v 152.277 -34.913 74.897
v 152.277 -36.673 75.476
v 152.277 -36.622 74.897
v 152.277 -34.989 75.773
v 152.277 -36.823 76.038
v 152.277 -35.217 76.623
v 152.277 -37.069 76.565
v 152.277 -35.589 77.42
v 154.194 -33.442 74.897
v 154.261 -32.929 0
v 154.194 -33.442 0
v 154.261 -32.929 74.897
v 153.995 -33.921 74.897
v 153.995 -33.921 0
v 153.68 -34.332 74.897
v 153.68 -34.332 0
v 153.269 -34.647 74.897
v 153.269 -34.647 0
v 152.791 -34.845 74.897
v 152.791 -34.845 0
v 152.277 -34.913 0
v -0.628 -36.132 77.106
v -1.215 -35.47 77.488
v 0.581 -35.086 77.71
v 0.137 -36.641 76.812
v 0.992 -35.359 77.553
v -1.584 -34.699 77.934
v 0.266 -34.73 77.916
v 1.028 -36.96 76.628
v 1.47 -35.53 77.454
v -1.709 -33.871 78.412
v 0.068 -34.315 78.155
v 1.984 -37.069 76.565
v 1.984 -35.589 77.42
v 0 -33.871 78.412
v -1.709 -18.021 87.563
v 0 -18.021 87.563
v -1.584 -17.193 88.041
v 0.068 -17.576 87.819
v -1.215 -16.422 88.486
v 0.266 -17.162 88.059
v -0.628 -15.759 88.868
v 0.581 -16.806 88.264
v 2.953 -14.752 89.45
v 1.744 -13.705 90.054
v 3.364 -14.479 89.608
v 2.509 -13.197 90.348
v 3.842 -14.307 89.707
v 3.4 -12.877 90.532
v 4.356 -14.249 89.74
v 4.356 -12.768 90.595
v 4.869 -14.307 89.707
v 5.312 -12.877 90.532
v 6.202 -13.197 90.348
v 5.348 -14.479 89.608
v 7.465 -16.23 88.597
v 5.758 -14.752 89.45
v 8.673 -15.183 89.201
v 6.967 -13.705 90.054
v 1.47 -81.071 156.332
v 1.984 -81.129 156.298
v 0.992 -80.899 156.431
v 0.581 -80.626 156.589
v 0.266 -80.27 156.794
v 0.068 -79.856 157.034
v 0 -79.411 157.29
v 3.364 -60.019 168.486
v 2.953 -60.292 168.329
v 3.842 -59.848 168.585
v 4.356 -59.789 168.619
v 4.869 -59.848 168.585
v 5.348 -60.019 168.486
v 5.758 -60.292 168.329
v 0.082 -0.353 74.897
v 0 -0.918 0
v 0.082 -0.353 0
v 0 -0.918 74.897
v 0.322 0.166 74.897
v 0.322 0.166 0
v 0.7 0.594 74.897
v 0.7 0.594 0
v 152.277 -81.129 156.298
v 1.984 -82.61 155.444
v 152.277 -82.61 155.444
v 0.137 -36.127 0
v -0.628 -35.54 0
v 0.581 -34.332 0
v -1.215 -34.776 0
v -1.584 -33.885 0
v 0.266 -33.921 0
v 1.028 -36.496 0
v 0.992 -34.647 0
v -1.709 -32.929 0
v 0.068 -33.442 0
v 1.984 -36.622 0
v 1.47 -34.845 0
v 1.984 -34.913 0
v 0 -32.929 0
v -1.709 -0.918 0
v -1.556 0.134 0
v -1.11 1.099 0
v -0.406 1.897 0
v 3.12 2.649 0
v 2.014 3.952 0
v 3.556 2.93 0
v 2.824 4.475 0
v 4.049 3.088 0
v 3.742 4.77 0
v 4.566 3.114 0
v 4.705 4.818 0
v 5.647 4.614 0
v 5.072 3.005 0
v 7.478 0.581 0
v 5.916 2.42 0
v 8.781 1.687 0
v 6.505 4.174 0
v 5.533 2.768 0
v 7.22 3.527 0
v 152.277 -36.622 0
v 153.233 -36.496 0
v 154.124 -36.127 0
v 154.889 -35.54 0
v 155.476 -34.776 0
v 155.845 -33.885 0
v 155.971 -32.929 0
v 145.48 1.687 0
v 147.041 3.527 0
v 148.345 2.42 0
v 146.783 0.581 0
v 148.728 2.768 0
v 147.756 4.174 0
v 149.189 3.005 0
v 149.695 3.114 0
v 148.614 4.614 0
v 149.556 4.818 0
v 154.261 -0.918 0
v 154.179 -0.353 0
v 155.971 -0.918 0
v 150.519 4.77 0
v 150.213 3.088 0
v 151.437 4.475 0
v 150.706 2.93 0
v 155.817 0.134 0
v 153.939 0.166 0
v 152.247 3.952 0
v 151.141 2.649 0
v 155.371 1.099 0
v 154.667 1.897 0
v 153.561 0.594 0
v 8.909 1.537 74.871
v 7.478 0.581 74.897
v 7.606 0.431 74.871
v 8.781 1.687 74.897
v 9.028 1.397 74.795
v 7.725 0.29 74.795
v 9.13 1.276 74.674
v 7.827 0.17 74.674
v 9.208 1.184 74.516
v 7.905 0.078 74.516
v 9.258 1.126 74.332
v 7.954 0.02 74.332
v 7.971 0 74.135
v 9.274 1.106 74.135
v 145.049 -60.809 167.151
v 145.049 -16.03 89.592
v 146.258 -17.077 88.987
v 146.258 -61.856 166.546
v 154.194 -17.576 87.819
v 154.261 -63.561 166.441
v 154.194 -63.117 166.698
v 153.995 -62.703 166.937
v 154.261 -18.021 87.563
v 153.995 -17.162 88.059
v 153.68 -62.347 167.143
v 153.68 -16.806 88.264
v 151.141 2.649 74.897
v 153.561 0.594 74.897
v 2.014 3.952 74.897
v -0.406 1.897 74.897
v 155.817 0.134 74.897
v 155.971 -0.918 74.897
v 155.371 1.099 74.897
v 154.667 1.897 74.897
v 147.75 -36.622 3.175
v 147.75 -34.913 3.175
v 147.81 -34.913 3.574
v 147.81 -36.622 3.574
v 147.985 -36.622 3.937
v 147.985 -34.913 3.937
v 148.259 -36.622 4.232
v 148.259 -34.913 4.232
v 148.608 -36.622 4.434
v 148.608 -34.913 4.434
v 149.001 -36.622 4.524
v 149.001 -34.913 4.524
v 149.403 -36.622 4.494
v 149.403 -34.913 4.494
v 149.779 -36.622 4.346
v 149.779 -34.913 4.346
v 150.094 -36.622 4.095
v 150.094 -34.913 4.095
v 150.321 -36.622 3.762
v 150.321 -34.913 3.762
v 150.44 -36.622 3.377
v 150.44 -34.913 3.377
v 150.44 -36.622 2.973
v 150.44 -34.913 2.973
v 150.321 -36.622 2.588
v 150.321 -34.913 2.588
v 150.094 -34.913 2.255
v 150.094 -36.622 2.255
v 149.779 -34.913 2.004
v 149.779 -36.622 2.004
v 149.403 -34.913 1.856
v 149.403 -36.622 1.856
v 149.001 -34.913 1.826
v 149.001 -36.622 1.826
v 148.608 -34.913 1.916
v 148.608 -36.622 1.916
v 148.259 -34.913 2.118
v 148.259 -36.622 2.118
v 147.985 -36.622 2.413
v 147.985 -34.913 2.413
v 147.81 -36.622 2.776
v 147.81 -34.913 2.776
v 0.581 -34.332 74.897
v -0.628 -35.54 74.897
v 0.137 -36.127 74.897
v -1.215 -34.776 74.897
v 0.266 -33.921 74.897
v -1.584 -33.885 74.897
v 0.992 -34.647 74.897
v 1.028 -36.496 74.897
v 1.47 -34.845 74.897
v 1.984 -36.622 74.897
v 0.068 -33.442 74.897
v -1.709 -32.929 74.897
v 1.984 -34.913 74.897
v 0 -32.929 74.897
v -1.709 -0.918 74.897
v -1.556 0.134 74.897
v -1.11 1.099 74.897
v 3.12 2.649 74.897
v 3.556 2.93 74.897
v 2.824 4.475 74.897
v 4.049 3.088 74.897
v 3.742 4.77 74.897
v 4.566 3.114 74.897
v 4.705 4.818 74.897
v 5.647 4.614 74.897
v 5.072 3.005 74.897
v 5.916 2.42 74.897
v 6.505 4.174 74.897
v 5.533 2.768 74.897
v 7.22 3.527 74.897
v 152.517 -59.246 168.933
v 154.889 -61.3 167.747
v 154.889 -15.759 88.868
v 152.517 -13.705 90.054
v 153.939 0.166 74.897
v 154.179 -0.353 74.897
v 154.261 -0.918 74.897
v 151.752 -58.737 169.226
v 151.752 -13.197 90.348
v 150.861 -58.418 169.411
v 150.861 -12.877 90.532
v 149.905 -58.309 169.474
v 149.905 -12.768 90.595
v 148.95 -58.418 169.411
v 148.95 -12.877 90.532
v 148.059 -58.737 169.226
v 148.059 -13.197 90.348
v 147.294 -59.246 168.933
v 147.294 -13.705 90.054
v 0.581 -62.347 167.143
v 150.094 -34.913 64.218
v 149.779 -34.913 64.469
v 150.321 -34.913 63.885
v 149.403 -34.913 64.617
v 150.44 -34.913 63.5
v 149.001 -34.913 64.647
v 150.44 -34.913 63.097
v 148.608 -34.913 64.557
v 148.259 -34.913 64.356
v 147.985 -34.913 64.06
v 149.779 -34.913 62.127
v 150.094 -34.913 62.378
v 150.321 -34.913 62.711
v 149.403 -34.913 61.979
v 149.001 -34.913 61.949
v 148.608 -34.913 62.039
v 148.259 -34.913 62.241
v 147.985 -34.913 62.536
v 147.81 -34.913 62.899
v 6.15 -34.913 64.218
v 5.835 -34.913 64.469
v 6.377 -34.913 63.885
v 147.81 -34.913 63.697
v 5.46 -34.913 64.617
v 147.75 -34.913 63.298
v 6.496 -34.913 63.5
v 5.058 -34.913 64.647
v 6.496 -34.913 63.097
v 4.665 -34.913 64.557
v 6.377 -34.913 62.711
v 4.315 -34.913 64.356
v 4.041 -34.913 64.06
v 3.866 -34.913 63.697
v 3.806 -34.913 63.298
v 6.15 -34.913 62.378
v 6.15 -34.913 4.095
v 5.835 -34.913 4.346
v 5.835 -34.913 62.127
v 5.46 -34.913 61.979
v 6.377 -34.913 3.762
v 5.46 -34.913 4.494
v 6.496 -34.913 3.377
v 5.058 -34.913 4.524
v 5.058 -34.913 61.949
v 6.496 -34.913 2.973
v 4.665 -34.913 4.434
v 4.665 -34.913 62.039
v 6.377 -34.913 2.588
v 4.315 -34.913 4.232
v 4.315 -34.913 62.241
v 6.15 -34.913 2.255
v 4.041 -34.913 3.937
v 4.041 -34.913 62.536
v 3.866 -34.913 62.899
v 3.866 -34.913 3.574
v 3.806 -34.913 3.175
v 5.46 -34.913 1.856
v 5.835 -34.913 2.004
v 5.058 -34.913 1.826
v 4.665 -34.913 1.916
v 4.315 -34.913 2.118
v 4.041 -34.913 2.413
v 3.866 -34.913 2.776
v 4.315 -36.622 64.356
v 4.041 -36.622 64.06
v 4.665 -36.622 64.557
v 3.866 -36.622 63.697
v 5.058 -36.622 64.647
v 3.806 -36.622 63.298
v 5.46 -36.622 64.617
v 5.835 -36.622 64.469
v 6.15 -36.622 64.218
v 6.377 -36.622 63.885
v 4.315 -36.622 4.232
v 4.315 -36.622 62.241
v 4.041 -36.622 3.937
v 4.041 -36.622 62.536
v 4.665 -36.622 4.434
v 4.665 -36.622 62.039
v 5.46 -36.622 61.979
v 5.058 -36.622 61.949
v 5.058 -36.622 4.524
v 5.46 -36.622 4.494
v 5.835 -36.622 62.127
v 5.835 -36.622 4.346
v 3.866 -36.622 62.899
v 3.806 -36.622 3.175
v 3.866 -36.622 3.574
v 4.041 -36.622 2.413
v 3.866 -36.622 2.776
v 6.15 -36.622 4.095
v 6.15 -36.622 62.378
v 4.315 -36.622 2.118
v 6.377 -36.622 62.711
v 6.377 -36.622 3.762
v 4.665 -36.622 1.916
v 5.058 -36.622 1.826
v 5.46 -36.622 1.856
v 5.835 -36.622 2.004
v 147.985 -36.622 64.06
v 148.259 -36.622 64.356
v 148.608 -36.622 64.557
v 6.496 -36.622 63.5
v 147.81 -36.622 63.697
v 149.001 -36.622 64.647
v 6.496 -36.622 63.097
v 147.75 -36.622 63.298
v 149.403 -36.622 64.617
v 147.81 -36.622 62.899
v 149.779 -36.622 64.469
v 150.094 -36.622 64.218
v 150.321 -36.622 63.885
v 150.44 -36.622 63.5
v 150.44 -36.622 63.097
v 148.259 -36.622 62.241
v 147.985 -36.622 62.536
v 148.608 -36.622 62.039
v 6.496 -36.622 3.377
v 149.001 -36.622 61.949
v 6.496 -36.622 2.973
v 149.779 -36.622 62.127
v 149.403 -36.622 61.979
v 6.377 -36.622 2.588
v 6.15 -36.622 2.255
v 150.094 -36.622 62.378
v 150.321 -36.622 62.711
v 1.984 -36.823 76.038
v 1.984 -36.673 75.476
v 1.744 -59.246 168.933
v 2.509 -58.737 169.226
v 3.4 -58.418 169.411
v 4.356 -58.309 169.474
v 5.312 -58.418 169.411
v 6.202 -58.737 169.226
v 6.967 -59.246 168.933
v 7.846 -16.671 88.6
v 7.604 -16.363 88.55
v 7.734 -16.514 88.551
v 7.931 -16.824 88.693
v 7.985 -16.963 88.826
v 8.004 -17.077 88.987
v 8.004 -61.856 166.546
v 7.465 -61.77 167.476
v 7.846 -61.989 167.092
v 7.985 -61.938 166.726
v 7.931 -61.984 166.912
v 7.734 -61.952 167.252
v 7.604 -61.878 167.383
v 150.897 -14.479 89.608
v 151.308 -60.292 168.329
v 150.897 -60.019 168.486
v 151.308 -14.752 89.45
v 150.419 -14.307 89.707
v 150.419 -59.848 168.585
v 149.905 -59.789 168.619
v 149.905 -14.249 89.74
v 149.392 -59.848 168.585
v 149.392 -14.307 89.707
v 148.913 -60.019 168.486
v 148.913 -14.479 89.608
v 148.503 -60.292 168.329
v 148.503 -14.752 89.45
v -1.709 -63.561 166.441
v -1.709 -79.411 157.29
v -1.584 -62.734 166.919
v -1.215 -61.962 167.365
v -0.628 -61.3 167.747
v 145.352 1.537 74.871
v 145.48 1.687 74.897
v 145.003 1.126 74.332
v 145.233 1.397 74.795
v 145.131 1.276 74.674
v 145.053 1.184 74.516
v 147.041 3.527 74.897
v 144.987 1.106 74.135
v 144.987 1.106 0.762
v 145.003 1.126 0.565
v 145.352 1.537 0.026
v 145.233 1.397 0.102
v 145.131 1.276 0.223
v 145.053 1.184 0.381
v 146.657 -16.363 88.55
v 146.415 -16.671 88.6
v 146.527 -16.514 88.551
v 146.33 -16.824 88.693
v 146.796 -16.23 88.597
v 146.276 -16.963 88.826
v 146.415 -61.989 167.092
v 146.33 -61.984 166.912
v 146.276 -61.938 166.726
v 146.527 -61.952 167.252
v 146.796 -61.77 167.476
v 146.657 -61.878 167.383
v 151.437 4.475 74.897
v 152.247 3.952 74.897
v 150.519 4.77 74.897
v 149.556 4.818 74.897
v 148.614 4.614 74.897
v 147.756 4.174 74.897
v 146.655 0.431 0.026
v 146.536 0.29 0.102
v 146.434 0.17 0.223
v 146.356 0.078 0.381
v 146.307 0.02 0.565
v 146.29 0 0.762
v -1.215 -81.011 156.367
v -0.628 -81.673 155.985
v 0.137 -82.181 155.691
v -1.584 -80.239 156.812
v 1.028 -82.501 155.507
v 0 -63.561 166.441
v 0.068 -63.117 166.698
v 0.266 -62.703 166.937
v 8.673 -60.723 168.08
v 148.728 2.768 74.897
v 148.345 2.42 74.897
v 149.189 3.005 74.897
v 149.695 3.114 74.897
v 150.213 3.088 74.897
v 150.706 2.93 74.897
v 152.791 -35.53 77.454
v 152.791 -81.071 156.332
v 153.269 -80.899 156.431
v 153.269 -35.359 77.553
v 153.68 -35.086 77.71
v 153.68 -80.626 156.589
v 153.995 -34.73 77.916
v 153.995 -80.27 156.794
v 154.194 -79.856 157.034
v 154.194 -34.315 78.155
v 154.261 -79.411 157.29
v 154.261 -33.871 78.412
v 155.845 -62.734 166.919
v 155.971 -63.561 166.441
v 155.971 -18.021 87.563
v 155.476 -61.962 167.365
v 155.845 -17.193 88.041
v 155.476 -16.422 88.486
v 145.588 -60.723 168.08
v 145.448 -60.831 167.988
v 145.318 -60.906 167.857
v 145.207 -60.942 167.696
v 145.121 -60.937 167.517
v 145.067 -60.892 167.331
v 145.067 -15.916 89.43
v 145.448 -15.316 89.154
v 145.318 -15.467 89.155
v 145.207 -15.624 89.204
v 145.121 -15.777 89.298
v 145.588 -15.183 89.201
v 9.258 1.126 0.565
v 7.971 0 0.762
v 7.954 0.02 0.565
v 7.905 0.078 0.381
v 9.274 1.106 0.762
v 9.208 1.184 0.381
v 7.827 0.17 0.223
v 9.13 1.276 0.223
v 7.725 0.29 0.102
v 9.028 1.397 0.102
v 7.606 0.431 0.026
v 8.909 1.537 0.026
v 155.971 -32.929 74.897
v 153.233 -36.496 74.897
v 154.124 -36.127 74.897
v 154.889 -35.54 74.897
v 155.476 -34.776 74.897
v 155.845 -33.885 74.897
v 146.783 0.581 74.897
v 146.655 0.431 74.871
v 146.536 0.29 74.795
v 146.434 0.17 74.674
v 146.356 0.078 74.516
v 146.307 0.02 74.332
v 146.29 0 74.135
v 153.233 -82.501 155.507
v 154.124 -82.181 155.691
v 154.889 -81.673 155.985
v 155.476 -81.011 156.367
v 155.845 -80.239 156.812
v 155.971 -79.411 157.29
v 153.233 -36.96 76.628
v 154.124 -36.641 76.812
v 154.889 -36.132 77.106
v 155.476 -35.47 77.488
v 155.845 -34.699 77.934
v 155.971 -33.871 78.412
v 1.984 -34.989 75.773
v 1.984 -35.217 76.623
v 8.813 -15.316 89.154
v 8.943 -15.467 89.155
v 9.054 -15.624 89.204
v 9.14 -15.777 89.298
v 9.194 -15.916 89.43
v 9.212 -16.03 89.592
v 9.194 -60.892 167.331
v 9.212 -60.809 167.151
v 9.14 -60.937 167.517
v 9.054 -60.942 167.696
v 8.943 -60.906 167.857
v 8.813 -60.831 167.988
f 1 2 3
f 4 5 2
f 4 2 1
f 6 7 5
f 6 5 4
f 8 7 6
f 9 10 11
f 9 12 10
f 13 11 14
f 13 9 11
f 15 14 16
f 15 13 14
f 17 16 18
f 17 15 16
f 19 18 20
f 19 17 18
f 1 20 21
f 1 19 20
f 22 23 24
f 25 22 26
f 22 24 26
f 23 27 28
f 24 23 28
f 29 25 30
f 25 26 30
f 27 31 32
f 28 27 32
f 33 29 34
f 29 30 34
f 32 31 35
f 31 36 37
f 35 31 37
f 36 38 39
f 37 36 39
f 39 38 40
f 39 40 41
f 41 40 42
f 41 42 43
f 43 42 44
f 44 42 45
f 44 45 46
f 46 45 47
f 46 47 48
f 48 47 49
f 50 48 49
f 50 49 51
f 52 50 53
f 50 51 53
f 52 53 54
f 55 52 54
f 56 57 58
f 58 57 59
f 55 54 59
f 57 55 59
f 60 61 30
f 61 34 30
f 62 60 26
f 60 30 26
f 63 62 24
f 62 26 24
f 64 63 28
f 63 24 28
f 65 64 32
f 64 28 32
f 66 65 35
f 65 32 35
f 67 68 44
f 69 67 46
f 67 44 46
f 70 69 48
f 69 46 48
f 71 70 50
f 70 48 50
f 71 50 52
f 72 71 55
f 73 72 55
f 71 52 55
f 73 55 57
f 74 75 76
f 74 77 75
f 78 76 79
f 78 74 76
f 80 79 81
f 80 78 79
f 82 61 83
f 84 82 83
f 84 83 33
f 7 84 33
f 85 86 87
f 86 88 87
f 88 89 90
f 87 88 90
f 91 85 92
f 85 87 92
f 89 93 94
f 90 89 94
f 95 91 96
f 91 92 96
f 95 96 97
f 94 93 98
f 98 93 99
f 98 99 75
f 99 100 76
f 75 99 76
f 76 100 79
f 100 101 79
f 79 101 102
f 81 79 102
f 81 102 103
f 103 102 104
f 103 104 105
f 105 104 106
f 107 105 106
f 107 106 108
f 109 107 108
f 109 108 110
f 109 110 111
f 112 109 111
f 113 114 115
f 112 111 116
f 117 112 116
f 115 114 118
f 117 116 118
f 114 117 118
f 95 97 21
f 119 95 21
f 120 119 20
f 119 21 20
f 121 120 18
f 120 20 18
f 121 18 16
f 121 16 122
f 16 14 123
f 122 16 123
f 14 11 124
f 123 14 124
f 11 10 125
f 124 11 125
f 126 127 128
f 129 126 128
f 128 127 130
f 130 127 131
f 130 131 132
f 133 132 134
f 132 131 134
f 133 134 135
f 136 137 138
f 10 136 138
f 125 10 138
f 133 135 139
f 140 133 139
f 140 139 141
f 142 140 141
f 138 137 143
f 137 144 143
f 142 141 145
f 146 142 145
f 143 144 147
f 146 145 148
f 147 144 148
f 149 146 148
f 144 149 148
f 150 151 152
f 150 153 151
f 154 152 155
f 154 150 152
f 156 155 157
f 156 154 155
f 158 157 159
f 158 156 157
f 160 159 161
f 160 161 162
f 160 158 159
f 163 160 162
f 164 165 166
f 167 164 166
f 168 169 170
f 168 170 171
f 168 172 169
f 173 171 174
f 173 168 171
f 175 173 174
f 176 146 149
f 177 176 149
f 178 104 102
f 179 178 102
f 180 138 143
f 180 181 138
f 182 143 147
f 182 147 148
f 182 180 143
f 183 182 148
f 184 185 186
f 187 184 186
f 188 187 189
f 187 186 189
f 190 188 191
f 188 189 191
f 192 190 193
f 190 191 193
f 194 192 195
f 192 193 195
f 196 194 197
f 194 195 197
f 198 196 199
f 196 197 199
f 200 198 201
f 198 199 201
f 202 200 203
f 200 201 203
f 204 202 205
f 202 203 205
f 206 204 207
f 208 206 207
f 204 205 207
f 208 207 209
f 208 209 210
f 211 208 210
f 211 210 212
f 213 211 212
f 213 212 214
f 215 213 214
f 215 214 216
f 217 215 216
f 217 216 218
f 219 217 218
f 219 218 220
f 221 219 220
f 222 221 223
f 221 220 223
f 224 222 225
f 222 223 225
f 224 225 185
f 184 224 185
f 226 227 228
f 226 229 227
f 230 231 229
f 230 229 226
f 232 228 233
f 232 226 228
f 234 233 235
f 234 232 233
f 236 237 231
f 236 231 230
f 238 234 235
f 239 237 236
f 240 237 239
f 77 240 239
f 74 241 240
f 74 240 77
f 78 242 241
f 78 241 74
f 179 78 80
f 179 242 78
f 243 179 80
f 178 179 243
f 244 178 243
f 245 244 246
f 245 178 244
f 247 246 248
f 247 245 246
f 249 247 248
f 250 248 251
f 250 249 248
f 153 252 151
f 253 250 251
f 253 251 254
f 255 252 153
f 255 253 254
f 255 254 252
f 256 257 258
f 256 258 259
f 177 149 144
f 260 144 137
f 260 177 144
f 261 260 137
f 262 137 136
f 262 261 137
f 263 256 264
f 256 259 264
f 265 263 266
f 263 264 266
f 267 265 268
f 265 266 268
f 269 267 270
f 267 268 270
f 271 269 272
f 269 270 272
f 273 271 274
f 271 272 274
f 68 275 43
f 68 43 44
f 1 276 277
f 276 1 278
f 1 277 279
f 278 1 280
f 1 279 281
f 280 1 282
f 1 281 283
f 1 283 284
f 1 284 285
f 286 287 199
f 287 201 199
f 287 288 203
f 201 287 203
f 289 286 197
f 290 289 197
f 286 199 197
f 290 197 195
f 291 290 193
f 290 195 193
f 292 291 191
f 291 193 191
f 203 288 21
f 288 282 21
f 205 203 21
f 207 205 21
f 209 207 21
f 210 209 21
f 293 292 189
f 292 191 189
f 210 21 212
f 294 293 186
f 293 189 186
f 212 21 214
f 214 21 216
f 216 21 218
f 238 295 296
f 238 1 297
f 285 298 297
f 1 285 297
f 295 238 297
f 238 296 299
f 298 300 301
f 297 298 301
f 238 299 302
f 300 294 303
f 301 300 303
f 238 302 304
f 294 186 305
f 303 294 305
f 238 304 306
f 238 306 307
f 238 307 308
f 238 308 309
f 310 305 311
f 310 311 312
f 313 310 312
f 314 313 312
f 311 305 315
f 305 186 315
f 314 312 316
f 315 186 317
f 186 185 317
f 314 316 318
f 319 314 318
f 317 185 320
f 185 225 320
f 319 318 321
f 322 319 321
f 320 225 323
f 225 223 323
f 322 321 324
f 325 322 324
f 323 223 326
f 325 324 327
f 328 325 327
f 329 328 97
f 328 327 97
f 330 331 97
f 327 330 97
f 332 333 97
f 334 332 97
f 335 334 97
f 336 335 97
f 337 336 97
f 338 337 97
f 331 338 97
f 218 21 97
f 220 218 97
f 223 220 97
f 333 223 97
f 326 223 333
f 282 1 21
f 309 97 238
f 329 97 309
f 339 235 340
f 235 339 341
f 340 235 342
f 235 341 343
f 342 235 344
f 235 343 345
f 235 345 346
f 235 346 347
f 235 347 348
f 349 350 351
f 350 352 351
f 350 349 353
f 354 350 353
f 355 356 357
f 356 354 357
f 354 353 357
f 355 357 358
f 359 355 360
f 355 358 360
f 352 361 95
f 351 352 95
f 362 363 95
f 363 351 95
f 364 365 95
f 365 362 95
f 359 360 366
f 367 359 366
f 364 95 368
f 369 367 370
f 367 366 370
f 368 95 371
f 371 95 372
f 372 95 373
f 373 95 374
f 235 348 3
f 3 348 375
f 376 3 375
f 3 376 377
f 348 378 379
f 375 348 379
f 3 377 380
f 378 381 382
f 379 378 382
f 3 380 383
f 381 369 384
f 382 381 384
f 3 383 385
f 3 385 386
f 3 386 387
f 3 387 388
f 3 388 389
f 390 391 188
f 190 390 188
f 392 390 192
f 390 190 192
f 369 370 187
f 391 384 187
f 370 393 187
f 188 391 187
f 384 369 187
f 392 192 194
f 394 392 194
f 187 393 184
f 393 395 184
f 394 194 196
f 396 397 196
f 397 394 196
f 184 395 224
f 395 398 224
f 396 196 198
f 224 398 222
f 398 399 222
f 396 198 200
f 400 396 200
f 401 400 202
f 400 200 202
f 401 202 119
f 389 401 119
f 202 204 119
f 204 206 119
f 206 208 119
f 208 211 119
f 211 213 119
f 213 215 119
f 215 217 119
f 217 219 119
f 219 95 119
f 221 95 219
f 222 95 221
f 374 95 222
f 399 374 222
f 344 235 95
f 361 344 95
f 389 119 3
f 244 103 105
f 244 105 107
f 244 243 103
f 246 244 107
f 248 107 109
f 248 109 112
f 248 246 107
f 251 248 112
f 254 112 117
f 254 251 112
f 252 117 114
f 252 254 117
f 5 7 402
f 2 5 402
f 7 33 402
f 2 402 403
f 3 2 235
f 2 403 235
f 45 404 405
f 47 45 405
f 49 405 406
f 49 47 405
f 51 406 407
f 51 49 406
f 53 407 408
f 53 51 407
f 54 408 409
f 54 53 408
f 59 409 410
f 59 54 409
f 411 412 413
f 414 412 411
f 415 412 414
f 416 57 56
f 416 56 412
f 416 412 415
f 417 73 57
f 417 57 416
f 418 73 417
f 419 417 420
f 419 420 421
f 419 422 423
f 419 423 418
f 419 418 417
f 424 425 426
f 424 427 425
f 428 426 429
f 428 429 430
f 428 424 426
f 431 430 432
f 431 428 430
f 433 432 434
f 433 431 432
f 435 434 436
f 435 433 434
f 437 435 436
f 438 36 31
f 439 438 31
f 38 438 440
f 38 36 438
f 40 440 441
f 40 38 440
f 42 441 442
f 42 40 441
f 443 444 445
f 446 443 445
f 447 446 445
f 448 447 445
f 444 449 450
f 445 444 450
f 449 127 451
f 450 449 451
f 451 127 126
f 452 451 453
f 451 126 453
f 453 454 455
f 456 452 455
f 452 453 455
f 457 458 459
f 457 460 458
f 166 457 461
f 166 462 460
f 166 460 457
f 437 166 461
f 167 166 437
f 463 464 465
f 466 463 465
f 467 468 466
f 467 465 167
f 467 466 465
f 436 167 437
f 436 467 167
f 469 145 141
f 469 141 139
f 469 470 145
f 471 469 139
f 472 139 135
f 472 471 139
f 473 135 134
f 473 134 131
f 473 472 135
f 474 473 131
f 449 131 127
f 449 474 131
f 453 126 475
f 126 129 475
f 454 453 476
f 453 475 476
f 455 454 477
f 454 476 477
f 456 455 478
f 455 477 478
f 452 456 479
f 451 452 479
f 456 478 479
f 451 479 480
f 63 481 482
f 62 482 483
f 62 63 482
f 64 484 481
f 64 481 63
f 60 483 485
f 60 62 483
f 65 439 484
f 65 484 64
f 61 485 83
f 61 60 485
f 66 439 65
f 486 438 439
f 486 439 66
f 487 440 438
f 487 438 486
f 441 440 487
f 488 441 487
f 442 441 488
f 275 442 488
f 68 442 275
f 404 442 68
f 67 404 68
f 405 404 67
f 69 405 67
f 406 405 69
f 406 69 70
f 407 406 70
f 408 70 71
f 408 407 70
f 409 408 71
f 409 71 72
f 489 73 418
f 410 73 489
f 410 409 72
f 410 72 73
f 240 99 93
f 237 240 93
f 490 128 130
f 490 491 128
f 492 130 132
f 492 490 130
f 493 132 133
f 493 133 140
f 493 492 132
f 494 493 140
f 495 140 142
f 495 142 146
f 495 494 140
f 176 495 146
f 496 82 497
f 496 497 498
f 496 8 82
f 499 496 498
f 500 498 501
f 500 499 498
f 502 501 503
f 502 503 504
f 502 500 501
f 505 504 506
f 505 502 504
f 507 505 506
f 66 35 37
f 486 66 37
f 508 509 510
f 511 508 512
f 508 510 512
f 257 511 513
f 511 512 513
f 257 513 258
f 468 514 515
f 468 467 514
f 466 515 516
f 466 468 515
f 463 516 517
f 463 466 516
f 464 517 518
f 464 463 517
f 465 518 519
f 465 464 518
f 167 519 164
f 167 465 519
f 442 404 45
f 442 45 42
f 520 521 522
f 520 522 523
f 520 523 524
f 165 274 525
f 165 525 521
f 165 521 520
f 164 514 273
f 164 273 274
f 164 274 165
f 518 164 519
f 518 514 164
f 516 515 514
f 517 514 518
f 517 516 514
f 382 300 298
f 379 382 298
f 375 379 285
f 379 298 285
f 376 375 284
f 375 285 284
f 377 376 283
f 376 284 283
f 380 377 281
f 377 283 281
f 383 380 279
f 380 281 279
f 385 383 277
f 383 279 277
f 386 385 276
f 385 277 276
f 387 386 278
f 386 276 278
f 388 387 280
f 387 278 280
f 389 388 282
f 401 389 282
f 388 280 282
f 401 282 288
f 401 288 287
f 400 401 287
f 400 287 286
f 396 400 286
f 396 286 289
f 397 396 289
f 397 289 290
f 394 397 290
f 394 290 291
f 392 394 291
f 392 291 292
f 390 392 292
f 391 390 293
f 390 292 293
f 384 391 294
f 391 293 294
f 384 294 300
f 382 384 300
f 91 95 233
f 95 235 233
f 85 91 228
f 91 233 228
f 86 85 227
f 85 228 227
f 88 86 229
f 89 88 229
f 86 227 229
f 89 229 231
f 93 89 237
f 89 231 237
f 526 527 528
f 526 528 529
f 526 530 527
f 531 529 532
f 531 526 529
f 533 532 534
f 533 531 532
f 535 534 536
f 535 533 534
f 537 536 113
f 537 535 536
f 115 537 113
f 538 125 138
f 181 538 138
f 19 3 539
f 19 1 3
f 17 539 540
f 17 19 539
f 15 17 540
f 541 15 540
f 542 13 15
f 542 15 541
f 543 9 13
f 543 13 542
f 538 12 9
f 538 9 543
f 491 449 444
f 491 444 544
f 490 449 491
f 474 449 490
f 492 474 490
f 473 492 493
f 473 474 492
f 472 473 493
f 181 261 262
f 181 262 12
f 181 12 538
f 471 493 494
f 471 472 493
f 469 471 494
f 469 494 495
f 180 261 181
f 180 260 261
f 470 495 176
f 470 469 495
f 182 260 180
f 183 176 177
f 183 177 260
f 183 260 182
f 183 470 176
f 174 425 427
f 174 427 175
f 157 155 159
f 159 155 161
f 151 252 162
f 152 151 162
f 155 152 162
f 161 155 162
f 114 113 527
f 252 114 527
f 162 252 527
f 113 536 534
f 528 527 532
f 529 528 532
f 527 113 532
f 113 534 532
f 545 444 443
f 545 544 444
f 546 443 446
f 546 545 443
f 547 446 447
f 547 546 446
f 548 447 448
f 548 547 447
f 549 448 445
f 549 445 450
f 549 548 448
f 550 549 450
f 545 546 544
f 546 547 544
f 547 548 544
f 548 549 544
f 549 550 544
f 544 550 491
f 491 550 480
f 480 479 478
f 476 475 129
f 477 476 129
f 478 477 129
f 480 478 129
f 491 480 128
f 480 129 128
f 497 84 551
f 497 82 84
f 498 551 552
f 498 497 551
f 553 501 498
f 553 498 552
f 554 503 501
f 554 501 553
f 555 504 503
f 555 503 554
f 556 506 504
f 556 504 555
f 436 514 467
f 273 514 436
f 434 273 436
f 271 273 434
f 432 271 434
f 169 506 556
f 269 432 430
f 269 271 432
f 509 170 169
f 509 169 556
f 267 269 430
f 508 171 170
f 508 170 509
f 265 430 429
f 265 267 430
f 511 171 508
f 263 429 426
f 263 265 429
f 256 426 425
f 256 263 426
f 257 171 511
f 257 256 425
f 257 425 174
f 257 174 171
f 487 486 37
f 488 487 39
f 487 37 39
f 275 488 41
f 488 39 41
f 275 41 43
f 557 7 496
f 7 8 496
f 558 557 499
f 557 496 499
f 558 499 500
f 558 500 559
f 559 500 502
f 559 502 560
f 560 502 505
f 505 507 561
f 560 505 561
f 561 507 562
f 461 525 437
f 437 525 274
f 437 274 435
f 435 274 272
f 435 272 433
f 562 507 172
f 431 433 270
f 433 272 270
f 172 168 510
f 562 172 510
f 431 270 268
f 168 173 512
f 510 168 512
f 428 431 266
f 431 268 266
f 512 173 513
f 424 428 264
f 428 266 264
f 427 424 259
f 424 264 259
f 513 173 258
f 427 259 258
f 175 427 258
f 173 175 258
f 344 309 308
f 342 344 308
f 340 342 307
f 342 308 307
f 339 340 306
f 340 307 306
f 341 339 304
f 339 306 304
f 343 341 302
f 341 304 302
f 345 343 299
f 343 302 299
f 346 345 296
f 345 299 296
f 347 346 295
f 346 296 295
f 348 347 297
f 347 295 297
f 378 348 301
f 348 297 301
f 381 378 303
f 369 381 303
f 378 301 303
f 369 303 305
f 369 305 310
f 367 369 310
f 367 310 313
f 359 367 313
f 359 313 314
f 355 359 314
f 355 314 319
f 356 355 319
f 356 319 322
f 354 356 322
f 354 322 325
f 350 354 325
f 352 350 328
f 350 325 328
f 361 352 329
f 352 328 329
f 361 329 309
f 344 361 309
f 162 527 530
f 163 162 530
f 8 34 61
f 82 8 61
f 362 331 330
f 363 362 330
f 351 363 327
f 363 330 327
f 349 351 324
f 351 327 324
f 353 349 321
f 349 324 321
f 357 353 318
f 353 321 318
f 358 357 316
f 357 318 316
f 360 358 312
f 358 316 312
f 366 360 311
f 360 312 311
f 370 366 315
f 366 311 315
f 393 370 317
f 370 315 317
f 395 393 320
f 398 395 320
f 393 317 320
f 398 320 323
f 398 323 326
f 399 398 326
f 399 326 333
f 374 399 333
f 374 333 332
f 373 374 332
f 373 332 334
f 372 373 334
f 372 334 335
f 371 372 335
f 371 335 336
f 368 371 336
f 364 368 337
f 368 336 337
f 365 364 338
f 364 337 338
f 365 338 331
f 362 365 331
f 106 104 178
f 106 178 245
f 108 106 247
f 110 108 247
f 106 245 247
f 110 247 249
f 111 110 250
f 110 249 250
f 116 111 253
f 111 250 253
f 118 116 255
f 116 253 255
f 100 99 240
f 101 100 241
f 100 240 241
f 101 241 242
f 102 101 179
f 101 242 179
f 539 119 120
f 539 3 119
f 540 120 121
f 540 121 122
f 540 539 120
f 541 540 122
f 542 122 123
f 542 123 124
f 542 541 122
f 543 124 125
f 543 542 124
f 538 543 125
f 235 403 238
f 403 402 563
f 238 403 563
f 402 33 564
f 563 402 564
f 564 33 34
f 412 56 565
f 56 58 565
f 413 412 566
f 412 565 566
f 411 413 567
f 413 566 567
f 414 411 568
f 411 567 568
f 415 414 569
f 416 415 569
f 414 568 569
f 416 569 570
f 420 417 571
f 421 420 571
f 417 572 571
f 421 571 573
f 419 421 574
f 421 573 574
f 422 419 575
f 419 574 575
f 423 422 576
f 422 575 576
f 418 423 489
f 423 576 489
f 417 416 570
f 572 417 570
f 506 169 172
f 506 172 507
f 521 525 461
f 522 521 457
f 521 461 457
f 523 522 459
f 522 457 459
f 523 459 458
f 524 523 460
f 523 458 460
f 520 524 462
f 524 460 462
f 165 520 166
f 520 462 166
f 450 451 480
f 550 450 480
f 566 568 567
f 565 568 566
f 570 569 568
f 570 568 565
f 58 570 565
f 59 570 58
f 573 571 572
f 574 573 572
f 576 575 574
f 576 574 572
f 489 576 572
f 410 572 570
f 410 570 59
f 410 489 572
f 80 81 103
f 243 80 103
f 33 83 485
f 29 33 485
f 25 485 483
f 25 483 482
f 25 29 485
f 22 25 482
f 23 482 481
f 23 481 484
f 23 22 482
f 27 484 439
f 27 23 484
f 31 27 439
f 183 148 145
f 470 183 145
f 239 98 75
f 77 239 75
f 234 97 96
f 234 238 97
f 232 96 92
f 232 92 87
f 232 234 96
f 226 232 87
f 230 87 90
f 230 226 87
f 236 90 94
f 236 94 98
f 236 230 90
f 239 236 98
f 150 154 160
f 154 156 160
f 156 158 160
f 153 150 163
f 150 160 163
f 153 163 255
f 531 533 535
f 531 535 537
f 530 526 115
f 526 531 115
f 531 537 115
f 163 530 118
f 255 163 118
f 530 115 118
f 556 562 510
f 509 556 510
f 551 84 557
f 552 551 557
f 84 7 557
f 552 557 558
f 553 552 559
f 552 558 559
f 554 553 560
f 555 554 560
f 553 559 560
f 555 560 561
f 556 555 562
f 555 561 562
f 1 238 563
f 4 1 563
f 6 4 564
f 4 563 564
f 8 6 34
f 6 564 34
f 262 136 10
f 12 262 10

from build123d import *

# Parameters (mm, degrees)
F1_DEPTH  = 74.8970308
F2_R      = 1.35255
F3_DEPTH  = 1.70942
F8_DEPTH  = 150.2936248359
F10_DEPTH = 91.0812758
F11_R     = 3.69315
F12_R     = 1.98373
F12_R_2   = 1.98374
F13_R     = 0.762


# Not quite as in the source:
# - a fillet or chamfer is up to 0.001 mm smaller than in the source, because OpenCascade refuses the exact size


with BuildPart() as f1:
    # F0 (on Top) → F1 (new body)
    with BuildSketch(Plane.XY):
        Polygon((0, -34.9127429517), (0, 0), (4.6326774961, 3.932751029), (7.9712502047, 0), (9.2744217668, 1.1062823402), (4.8295667179, 6.3422049313), (-1.70942, 0.7911587457), (-1.70942, -36.6221629517), (155.9705248359, -36.6221629517), (155.9705248359, 0.7911587457), (149.4315381179, 6.3422049313), (144.9866830691, 1.1062823402), (146.2898546311, 0), (149.6284273398, 3.932751029), (154.2611048359, 0), (154.2611048359, -34.9127429517), align=None)
    extrude(amount=F1_DEPTH)

    # F2 (on face) → F3 (cut, through all)
    with BuildSketch(Plane(origin=(0, -34.9127429517, 0), x_dir=(-1, 0, 0), z_dir=(0, 1, 0))):
        with Locations((-5.15874, 3.175)):
            Circle(F2_R)
        with Locations((-5.15874, 63.2981208)):
            Circle(F2_R)
        with Locations((-149.1023648359, 63.2981208)):
            Circle(F2_R)
        with Locations((-149.1023648359, 3.175)):
            Circle(F2_R)
    extrude(amount=-F3_DEPTH, mode=Mode.SUBTRACT)

    # F7 (on offset) → F8 (join, through all)
    with BuildSketch(Plane.YZ.offset(1.98374)):
        with BuildLine():
            Line((-36.6221629517, 74.8970308), (-34.9127429517, 74.8970308))
            ThreePointArc((-34.9127429517, 74.8970308), (-35.0846656967, 76.2029136969), (-35.5887176805, 77.4198028324))
            Line((-35.5887176805, 77.4198028324), (-81.129350806, 156.2984932146))
            Line((-81.129350806, 156.2984932146), (-82.6097519517, 155.4437832146))
            Line((-82.6097519517, 155.4437832146), (-37.0691188262, 76.5650928324))
            ThreePointArc((-37.0691188262, 76.5650928324), (-36.7358386226, 75.7604832448), (-36.6221629517, 74.8970308))
        make_face()
    extrude(amount=F8_DEPTH)

    # F9 (on face) → F10 (join)
    with BuildSketch(Plane(origin=(0, -87.96157055, 152.3539093062), x_dir=(1, 0, 0), z_dir=(0, -0.5, 0.8660254038))):
        Polygon((-1.7094199999, 6.1797478168), (1.98374, 6.1797478168), (1.98374, 7.8891678168), (0, 7.8891678168), (1e-10, 28.9964815425), (4.3557372213, 33.3522187635), (8.0035172575, 29.7044387269), (9.2122597315, 30.9131812007), (4.3557372215, 35.7697037112), (-1.7094199999, 29.7045464903), align=None)
        Polygon((152.277364836, 7.8891678168), (152.277364836, 6.1797478168), (155.9705248359, 6.1797478168), (155.9705248359, 29.7045464903), (149.9053676148, 35.7697037114), (145.0488451045, 30.9131812012), (146.2575875784, 29.7044387273), (149.9053676148, 33.3522187636), (154.2611048359, 28.9964815425), (154.2611048359, 7.8891678168), align=None)
    extrude(amount=-F10_DEPTH)

    # F11 (radius 3.69316 in the source; OpenCascade refuses exactly that, so slightly less here)
    f11_edges = [f1.edges().sort_by_distance(p)[0] for p in [
        (149.431538, 6.342205, 37.448515),
        (155.970525, 0.791159, 37.448515),
        (155.970525, -36.622163, 37.448515),
        (-1.70942, -36.622163, 37.448515),
        (-1.70942, 0.791159, 37.448515),
        (4.829567, 6.342205, 37.448515),
        (149.905368, -34.21378, 130.799412),
        (155.970525, -39.46636, 127.766833),
        (155.970525, -59.839433, 116.004434),
        (-1.70942, -59.839433, 116.004434),
        (-1.70942, -39.46636, 127.766833),
        (4.355737, -34.21378, 130.799412),
    ]]
    fillet(f11_edges, radius=F11_R)

    # F12#9 (call 1 of 12: OpenCascade refuses the feature's edges together) (radius 1.98374 in the source; OpenCascade refuses exactly that, so slightly less here)
    f12_9_edges = [f1.edges().sort_by_distance(p)[0] for p in [
        (0, -58.359032, 116.859144),
    ]]
    fillet(f12_9_edges, radius=F12_R)

    # F12#10 (call 2 of 12) (radius 1.98374 in the source; OpenCascade refuses exactly that, so slightly less here)
    f12_10_edges = [f1.edges().sort_by_distance(p)[0] for p in [
        (154.261105, -58.359032, 116.859144),
    ]]
    fillet(f12_10_edges, radius=F12_R)

    # F12#11 (call 3 of 12)
    f12_11_edges = [f1.edges().sort_by_distance(p)[0] for p in [
        (154.261105, -40.079562, 127.412801),
    ]]
    fillet(f12_11_edges, radius=F12_R_2)

    # F12#12 (call 4 of 12)
    f12_12_edges = [f1.edges().sort_by_distance(p)[0] for p in [
        (149.905368, -36.307383, 129.590669),
    ]]
    fillet(f12_12_edges, radius=F12_R_2)

    # F12 (call 5 of 12)
    f12_edges = [f1.edges().sort_by_distance(p)[0] for p in [
        (149.628427, 3.932751, 37.448515),
    ]]
    fillet(f12_edges, radius=F12_R_2)

    # F12#2 (call 6 of 12)
    f12_2_edges = [f1.edges().sort_by_distance(p)[0] for p in [
        (154.261105, 0, 37.448515),
    ]]
    fillet(f12_2_edges, radius=F12_R_2)

    # F12#3 (call 7 of 12)
    f12_3_edges = [f1.edges().sort_by_distance(p)[0] for p in [
        (154.261105, -34.912743, 37.448515),
    ]]
    fillet(f12_3_edges, radius=F12_R_2)

    # F12#4 (call 8 of 12)
    f12_4_edges = [f1.edges().sort_by_distance(p)[0] for p in [
        (0, -34.912743, 37.448515),
    ]]
    fillet(f12_4_edges, radius=F12_R_2)

    # F12#5 (call 9 of 12)
    f12_5_edges = [f1.edges().sort_by_distance(p)[0] for p in [
        (0, 0, 37.448515),
    ]]
    fillet(f12_5_edges, radius=F12_R_2)

    # F12#6 (call 10 of 12)
    f12_6_edges = [f1.edges().sort_by_distance(p)[0] for p in [
        (4.632677, 3.932751, 37.448515),
    ]]
    fillet(f12_6_edges, radius=F12_R_2)

    # F12#7 (call 11 of 12)
    f12_7_edges = [f1.edges().sort_by_distance(p)[0] for p in [
        (0, -40.079562, 127.412801),
    ]]
    fillet(f12_7_edges, radius=F12_R_2)

    # F12#8 (call 12 of 12)
    f12_8_edges = [f1.edges().sort_by_distance(p)[0] for p in [
        (4.355737, -36.307383, 129.590669),
    ]]
    fillet(f12_8_edges, radius=F12_R_2)

    # F13
    f13_edges = [f1.edges().sort_by_distance(p)[0] for p in [
        (145.638269, 0.553141, 74.897031),
        (145.638269, 0.553141, 0),
        (8.622836, 0.553141, 0),
        (8.622836, 0.553141, 74.897031),
        (8.607888, -61.713371, 167.508314),
        (8.607888, -16.172733, 88.629616),
        (145.653216, -16.172733, 88.629616),
        (145.653216, -61.713371, 167.508314),
    ]]
    fillet(f13_edges, radius=F13_R)


solid = f1.part
